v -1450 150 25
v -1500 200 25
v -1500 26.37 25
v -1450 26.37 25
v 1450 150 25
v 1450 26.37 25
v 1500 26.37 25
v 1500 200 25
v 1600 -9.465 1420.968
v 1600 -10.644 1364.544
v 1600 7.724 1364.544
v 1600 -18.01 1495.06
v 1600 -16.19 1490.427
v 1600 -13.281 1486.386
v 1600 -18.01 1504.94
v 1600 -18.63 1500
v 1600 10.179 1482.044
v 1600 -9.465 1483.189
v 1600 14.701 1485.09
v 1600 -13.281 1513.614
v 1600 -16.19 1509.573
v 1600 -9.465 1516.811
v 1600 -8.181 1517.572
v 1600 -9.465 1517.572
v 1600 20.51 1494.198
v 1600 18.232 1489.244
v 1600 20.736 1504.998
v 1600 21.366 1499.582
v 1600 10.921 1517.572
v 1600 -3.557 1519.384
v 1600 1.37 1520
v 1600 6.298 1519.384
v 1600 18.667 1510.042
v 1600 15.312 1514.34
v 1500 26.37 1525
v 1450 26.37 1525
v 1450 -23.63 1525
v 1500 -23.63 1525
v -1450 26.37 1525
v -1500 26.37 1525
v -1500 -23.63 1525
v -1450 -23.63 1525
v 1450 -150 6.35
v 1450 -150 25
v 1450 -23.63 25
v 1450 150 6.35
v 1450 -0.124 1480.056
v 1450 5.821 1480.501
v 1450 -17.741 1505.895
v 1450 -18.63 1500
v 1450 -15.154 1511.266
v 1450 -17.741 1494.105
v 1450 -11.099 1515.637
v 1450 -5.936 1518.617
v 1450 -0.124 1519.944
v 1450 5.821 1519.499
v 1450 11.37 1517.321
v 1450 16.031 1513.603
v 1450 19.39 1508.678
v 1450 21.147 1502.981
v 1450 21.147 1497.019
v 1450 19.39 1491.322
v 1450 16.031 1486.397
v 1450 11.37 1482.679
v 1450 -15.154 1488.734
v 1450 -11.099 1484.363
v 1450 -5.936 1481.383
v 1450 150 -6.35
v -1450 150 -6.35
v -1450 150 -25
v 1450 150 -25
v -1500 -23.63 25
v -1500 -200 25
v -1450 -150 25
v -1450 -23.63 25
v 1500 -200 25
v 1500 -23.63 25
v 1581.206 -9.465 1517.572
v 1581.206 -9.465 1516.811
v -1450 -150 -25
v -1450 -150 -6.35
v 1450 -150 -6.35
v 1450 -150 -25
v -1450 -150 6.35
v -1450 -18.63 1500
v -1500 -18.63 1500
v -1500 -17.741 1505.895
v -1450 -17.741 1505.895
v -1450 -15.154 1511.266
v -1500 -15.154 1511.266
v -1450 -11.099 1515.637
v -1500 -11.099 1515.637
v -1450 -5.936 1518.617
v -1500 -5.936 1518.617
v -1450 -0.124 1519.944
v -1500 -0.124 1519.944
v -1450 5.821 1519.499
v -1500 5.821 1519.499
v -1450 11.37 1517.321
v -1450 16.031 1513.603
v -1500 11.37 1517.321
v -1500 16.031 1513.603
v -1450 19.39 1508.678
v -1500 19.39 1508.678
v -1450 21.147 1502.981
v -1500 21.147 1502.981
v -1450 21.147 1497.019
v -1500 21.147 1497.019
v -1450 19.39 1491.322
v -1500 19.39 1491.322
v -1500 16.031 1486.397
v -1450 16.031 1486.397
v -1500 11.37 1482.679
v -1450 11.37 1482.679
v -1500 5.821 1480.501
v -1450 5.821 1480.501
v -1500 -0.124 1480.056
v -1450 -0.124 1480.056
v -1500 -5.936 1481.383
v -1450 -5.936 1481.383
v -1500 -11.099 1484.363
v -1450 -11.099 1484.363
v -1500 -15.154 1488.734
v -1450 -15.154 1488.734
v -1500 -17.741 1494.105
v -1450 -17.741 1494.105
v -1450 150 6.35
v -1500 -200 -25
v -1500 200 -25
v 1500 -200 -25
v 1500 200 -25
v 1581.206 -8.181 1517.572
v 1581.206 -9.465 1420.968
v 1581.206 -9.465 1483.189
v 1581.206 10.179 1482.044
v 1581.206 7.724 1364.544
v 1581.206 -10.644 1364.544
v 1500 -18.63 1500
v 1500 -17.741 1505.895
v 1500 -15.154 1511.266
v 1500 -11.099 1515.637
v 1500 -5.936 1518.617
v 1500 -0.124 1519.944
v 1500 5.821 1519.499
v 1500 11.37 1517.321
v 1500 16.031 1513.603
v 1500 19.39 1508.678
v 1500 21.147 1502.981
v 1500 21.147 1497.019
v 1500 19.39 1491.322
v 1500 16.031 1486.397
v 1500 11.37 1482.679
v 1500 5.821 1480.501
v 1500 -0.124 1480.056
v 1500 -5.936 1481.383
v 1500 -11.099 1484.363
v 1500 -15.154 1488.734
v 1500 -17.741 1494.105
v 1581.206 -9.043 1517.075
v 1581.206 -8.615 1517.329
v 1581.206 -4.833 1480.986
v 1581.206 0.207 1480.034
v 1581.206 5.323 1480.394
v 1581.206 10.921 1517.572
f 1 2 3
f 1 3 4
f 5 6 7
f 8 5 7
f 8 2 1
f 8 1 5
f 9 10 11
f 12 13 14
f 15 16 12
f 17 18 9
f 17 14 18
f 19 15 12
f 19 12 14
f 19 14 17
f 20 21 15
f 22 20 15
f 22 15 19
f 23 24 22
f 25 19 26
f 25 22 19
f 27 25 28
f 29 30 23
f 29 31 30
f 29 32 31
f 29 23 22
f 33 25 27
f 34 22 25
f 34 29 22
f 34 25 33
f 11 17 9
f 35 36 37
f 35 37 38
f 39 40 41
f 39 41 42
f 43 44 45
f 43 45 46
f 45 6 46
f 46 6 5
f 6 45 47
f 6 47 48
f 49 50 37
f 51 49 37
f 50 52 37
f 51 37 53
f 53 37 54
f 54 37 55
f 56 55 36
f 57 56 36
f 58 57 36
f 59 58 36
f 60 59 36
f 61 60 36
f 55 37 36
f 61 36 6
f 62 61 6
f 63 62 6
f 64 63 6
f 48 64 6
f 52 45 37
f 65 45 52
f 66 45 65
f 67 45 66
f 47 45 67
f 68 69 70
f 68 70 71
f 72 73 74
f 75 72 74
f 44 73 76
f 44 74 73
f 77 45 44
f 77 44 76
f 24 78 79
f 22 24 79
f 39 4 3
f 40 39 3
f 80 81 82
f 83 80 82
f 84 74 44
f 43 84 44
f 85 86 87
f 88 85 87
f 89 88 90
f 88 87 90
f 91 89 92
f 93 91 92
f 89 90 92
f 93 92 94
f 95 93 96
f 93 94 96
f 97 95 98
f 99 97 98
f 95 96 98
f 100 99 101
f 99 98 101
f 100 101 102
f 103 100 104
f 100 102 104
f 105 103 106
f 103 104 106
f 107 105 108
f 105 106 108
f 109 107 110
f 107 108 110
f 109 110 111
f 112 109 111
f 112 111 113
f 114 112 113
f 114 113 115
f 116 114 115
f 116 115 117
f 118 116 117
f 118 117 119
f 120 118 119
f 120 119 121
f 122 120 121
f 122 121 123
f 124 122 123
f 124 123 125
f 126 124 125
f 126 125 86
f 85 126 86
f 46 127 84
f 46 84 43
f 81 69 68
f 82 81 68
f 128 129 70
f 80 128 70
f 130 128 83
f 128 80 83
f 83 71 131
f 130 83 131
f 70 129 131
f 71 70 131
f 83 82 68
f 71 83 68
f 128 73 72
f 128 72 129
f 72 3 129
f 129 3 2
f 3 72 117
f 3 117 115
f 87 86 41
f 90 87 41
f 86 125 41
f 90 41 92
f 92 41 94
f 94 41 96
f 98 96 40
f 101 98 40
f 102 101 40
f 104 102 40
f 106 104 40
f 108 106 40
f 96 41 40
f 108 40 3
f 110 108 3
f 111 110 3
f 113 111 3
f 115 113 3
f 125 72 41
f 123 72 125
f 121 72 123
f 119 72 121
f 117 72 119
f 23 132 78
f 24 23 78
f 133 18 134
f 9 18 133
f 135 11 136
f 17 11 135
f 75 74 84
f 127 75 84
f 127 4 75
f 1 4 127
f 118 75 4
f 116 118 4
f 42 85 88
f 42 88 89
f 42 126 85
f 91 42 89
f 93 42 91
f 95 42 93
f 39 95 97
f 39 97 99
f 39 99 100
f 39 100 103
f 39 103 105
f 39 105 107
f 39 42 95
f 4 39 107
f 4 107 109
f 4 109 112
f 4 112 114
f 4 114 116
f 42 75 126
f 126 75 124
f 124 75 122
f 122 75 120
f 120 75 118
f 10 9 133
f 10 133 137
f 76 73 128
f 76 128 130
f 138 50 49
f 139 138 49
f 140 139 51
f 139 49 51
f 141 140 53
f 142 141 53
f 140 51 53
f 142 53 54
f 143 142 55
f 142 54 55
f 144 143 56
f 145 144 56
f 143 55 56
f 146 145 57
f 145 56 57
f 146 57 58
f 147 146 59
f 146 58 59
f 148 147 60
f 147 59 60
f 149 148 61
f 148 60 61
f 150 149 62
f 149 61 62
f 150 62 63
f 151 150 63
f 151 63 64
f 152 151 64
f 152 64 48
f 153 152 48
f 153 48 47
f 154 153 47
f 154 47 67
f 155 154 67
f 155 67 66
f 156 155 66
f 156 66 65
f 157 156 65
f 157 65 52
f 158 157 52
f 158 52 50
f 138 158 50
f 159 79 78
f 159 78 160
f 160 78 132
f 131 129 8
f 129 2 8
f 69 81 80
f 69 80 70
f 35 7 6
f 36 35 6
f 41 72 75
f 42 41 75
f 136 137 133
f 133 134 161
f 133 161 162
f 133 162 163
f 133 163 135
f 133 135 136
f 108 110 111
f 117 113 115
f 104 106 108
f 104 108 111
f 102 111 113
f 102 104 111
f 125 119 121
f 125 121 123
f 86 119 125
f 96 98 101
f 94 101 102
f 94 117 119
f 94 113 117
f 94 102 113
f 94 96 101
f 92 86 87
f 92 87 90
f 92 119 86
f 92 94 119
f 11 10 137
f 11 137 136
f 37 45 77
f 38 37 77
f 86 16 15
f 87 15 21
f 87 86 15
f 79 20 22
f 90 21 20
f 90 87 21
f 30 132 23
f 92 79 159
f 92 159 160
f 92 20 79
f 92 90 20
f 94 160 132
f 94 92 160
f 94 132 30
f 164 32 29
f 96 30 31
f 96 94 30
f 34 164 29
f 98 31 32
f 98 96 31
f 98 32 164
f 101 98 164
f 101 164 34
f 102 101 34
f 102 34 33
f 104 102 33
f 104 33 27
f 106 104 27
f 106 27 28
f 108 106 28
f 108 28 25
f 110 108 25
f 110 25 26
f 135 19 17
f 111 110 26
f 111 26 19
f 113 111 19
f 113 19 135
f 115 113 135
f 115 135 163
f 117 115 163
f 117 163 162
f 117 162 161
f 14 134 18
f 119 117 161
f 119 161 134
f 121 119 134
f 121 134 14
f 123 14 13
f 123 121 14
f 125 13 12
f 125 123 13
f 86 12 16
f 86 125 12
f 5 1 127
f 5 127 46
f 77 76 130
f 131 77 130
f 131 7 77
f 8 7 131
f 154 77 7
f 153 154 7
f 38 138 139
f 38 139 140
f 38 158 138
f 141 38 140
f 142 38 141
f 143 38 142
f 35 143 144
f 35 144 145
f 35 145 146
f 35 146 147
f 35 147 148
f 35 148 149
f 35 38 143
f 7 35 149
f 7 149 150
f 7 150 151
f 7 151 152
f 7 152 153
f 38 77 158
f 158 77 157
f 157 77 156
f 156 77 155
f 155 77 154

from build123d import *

# Parameters (mm, degrees)
F0_W      = 3000
F0_H      = 400
F0_W_2    = 2900
F0_H_2    = 300
F1_DEPTH  = 25
F3_DEPTH  = 1500
F4_R      = 20
F5_DEPTH  = 3064.82128
F6_R      = 20
F7_DEPTH  = 3100
F9_DEPTH  = 18.79415
F12_DEPTH = 6.35


# Not quite as in the source:
# - a feature names something its author has since deleted; it is built from what else it names
# - the program builds the solid bodies; features that only make, move or delete a surface that nothing else refers to are left out


with BuildPart() as f1:
    # F0 (on Top) → F1 (new body, symmetric)
    with BuildSketch(Plane.XY):
        Rectangle(F0_W, F0_H)
        Rectangle(F0_W_2, F0_H_2, mode=Mode.SUBTRACT)
    extrude(amount=F1_DEPTH, both=True)

    # F2 (on face) → F3 (join)
    with BuildSketch(Plane.XY.offset(25)):
        Polygon((-1500, 26.3704165816), (-1500, 0), (-1500, -23.6295834184), (-1450, -23.6295834184), (-1450, 26.3704165816), align=None)
        Polygon((1500, -23.6295834184), (1500, 0), (1500, 26.3704165816), (1450, 26.3704165816), (1450, -23.6295834184), align=None)
    extrude(amount=F3_DEPTH)

    # F4 (on face) → F5 (cut)
    with BuildSketch(Plane(origin=(-1500, 0, 0), x_dir=(0, -1, 0), z_dir=(-1, 0, 0))):
        with Locations((-1.3704165816, 1500)):
            Circle(F4_R)
    extrude(amount=-F5_DEPTH, mode=Mode.SUBTRACT)

    # F0 (on Top) → F12 (join, symmetric)
    with BuildSketch(Plane.XY):
        Rectangle(F0_W_2, F0_H_2)
    extrude(amount=F12_DEPTH, both=True)


with BuildPart() as f7:
    # F6 (on face) → F7 (new body)
    with BuildSketch(Plane(origin=(-1500, 0, 0), x_dir=(0, -1, 0), z_dir=(-1, 0, 0))):
        with Locations((-1.3704165816, 1500)):
            Circle(F6_R)
    extrude(amount=-F7_DEPTH)

    # F8 (on face) → F9 (join)
    with BuildSketch(Plane.YZ.offset(1600)):
        Polygon((-9.4648035193, 1420.9684346451), (-10.6437923387, 1364.5441532135), (7.7239090577, 1364.5441532135), (10.9214369768, 1517.5720803951), (-9.4648035193, 1517.5720803951), align=None)
    extrude(amount=-F9_DEPTH)


solid = Compound([f1.part, f7.part])
